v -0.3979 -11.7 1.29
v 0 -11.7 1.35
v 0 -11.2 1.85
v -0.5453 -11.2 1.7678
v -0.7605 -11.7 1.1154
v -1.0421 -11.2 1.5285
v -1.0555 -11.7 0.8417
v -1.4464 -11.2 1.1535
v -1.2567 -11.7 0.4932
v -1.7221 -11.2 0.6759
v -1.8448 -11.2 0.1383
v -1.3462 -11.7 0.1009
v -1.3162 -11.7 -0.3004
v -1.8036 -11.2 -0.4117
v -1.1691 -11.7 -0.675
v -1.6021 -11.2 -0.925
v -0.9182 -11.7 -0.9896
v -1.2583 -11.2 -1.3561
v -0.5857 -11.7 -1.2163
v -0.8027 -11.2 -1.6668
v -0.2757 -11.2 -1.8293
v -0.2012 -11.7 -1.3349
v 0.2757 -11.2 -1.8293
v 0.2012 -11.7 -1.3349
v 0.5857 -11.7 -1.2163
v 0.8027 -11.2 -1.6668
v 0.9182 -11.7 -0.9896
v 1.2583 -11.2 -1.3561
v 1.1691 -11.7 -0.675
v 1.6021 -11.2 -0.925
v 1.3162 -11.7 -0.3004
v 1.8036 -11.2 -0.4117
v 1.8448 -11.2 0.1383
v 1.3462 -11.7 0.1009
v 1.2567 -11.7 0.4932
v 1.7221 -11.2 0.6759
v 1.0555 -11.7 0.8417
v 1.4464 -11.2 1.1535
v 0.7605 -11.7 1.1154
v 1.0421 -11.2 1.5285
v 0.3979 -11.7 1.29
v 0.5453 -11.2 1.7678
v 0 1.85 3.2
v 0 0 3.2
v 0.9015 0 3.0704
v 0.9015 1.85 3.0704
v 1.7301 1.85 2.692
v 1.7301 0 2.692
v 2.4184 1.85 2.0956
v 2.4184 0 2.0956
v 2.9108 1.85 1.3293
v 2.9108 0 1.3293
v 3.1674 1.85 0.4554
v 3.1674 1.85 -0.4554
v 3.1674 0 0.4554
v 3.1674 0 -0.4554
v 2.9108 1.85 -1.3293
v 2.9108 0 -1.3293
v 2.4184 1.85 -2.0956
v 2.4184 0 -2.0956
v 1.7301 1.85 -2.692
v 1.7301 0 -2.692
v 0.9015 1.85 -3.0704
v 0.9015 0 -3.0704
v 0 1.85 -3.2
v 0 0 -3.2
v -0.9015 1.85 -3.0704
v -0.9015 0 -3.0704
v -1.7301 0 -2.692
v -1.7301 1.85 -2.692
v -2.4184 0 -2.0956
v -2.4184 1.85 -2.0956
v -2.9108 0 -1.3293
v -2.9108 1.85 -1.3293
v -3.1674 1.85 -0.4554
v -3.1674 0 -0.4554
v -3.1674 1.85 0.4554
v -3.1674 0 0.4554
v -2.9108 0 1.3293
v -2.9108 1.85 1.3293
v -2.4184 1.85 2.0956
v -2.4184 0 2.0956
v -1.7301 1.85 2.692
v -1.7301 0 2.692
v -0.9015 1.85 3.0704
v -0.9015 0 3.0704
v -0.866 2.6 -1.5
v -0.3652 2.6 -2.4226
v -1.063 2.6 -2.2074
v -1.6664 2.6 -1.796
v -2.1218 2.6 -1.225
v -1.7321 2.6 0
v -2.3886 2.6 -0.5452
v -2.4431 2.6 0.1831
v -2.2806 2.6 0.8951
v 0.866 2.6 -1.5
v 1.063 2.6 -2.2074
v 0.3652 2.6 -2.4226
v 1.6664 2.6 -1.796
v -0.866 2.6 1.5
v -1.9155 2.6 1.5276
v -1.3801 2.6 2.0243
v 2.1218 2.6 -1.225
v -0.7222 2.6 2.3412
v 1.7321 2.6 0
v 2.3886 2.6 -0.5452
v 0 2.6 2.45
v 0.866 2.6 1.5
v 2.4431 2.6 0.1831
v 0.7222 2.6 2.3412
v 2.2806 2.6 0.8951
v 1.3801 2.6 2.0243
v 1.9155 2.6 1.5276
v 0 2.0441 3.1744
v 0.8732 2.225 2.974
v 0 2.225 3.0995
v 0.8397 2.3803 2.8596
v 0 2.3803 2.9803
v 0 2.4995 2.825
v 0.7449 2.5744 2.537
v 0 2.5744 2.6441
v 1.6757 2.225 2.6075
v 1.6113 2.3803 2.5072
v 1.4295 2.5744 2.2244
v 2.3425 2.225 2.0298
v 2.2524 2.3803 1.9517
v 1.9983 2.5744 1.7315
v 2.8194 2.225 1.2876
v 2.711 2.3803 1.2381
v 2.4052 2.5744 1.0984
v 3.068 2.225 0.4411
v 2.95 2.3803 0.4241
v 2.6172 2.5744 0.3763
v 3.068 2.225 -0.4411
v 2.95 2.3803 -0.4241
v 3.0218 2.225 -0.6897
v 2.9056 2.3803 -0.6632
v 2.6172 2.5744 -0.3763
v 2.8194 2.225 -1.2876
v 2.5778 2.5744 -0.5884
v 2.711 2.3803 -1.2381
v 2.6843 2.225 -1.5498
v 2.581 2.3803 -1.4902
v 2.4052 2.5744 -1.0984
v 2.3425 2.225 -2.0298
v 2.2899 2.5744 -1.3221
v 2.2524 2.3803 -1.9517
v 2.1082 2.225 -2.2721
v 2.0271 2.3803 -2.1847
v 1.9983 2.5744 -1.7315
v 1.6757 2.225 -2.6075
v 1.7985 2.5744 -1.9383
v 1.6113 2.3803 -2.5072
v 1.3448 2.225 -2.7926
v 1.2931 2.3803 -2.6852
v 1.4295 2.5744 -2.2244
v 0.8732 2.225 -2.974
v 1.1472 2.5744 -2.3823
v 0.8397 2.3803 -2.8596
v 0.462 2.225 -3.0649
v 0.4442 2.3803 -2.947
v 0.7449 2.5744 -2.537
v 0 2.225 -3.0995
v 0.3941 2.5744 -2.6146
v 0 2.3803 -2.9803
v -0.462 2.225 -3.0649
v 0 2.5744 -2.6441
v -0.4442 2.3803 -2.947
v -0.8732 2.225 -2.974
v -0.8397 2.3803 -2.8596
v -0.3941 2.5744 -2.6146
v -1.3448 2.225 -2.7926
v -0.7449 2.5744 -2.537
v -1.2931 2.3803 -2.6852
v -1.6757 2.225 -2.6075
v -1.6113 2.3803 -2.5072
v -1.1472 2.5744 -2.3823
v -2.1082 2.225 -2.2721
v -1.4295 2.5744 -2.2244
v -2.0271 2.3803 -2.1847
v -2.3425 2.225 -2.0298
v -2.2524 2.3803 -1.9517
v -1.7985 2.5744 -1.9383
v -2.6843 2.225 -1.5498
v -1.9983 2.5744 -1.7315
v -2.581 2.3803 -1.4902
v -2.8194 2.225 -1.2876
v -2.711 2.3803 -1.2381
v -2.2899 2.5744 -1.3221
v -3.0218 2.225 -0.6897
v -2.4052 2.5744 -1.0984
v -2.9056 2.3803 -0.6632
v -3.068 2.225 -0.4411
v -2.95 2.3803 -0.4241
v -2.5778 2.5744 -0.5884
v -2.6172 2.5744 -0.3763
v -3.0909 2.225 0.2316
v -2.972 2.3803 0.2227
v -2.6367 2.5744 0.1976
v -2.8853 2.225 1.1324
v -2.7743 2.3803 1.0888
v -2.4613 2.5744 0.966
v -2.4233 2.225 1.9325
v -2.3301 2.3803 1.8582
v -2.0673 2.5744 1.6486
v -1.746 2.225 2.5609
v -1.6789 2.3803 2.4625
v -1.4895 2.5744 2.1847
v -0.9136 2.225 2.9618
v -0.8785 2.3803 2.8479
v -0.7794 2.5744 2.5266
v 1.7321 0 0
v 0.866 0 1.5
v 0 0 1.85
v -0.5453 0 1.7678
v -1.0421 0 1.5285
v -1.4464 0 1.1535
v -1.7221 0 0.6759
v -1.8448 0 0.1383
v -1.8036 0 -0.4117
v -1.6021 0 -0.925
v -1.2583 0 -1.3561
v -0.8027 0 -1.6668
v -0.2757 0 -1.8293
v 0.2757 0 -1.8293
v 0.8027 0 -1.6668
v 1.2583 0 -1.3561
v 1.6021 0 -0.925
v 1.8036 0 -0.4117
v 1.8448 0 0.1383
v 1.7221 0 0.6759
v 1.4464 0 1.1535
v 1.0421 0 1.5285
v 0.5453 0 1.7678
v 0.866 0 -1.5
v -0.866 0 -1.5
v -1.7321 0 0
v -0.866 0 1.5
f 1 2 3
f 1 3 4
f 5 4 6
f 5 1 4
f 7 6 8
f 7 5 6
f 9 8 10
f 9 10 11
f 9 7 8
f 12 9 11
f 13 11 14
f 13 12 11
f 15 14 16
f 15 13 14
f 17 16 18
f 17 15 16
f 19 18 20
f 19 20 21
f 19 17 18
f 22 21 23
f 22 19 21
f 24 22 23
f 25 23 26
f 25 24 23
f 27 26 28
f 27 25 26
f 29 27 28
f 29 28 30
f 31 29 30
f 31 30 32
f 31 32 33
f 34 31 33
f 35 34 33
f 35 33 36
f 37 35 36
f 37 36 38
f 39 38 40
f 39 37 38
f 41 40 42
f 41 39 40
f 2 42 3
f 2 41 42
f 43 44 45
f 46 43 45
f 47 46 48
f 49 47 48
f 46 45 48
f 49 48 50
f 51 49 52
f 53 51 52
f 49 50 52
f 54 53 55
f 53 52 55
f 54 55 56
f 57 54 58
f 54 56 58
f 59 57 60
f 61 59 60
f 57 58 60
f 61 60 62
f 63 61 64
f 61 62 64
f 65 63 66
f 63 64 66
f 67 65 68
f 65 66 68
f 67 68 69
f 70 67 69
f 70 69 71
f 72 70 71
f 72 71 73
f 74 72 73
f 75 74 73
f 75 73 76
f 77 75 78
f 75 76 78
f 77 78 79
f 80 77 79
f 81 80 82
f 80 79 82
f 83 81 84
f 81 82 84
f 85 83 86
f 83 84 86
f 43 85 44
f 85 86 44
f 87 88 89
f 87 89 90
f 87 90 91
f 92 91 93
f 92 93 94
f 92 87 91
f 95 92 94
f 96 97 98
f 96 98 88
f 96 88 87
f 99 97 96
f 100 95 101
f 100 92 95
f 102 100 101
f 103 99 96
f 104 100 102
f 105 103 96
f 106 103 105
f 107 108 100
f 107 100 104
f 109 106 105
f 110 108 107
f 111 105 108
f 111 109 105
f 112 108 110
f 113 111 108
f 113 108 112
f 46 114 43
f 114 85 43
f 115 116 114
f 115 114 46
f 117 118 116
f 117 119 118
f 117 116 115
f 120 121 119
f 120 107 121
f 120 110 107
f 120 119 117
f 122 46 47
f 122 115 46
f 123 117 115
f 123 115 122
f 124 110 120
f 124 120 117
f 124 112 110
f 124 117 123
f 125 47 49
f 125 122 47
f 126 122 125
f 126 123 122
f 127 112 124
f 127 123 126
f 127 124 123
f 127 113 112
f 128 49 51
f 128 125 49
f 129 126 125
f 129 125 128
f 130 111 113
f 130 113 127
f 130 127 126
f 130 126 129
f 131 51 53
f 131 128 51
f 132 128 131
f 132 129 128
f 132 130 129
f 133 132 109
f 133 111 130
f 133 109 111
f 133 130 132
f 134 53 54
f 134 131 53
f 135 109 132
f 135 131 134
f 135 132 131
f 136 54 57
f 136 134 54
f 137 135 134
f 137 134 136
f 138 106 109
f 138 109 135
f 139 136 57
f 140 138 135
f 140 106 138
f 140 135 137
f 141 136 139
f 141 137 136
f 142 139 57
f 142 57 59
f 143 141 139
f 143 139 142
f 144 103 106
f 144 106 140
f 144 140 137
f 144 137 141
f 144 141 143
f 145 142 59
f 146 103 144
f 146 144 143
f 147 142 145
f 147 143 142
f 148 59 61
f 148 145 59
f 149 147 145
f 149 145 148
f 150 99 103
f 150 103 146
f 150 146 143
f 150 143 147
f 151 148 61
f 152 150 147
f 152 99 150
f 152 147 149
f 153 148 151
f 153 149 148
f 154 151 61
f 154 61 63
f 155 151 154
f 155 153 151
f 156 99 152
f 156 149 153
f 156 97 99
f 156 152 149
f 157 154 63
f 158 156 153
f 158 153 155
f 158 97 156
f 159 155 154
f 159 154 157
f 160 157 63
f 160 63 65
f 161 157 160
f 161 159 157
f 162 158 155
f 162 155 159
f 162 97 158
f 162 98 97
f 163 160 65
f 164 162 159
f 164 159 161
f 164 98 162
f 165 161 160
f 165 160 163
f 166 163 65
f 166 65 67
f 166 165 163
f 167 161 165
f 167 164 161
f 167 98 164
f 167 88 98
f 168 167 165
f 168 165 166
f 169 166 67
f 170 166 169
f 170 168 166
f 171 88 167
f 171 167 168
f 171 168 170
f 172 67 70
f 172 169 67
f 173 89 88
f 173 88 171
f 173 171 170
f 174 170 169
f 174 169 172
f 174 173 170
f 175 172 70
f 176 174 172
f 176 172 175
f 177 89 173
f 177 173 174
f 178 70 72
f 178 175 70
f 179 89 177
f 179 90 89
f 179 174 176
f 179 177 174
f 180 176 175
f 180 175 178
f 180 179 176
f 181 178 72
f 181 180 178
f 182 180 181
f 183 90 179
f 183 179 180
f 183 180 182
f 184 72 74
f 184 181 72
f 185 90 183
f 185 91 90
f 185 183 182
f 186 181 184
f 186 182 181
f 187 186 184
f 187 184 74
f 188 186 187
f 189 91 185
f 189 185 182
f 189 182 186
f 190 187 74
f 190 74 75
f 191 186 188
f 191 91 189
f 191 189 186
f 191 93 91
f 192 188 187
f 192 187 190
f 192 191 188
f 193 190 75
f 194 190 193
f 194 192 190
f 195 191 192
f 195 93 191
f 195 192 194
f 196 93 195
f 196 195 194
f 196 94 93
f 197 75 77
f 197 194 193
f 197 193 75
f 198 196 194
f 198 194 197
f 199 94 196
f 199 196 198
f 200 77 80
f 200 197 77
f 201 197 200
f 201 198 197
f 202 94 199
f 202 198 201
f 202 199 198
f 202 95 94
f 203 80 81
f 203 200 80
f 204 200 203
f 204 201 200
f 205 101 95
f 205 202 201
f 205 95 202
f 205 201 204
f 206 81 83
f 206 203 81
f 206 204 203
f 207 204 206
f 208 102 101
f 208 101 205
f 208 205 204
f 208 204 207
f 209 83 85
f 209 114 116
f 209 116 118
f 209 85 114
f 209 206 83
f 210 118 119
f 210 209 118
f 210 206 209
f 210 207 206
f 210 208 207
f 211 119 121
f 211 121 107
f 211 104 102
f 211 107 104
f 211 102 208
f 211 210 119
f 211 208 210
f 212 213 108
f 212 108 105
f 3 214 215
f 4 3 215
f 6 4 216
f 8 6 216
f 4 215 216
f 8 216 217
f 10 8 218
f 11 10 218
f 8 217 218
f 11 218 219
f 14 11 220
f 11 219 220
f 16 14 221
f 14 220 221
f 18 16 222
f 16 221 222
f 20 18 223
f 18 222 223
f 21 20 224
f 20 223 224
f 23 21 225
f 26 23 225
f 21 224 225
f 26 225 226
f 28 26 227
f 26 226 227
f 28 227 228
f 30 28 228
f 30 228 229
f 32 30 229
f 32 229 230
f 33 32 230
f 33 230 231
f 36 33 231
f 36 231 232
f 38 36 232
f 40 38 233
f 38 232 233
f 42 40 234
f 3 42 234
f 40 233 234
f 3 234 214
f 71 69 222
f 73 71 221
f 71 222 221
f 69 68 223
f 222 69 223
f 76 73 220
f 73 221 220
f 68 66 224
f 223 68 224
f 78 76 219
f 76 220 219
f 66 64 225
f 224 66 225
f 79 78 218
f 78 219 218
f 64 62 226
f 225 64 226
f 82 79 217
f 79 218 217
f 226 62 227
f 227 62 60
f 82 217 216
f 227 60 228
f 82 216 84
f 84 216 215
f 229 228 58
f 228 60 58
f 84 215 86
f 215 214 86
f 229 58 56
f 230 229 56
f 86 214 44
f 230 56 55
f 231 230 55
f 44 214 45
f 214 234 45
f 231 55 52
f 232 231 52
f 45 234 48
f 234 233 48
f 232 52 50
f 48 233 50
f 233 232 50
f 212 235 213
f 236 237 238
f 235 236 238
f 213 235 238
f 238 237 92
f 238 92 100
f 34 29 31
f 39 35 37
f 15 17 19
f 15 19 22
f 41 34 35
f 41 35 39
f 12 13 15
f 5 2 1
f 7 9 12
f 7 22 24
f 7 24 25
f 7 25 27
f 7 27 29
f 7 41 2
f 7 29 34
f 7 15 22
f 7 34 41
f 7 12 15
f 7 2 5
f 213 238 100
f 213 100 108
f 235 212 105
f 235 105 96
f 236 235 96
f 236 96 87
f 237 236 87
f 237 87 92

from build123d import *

# Parameters (mm, degrees)
SKETCH1_R           = 3.2
BOSS_EXTRUDE1_DEPTH = 2.6
FILLET1_R           = 0.75
SKETCH2_R           = 1.85
BOSS_EXTRUDE2_DEPTH = 11.7
CHAMFER1_SIZE       = 0.5


with BuildPart() as part:
    # Sketch1 → Boss-Extrude1 (new body)
    with BuildSketch(Plane(origin=(0, 0, 0), x_dir=(1, 0, 0), z_dir=(0, 1, 0))):
        with Locations(Location((0, 0, 0), (0, 0, 270))):
            Circle(SKETCH1_R)
        Polygon((1.732050808, 0), (0.866025404, 1.5), (-0.866025404, 1.5), (-1.732050808, 0), (-0.866025404, -1.5), (0.866025404, -1.5), align=None, mode=Mode.SUBTRACT)
    extrude(amount=BOSS_EXTRUDE1_DEPTH)

    # Fillet1
    fillet1_edges = [part.edges().sort_by_distance(p)[0] for p in [
        (0, 2.6, -3.2),
    ]]
    fillet(fillet1_edges, radius=FILLET1_R)

    # Sketch2 → Boss-Extrude2 (add)
    with BuildSketch(Plane.XZ):
        with Locations(Location((0, 0, 0), (0, 0, 90))):
            Circle(SKETCH2_R)
    extrude(amount=BOSS_EXTRUDE2_DEPTH)

    # Chamfer1
    chamfer1_edges = [part.edges().sort_by_distance(p)[0] for p in [
        (0, -11.7, -1.85),
    ]]
    chamfer(chamfer1_edges, length=CHAMFER1_SIZE)


solid = part.part
